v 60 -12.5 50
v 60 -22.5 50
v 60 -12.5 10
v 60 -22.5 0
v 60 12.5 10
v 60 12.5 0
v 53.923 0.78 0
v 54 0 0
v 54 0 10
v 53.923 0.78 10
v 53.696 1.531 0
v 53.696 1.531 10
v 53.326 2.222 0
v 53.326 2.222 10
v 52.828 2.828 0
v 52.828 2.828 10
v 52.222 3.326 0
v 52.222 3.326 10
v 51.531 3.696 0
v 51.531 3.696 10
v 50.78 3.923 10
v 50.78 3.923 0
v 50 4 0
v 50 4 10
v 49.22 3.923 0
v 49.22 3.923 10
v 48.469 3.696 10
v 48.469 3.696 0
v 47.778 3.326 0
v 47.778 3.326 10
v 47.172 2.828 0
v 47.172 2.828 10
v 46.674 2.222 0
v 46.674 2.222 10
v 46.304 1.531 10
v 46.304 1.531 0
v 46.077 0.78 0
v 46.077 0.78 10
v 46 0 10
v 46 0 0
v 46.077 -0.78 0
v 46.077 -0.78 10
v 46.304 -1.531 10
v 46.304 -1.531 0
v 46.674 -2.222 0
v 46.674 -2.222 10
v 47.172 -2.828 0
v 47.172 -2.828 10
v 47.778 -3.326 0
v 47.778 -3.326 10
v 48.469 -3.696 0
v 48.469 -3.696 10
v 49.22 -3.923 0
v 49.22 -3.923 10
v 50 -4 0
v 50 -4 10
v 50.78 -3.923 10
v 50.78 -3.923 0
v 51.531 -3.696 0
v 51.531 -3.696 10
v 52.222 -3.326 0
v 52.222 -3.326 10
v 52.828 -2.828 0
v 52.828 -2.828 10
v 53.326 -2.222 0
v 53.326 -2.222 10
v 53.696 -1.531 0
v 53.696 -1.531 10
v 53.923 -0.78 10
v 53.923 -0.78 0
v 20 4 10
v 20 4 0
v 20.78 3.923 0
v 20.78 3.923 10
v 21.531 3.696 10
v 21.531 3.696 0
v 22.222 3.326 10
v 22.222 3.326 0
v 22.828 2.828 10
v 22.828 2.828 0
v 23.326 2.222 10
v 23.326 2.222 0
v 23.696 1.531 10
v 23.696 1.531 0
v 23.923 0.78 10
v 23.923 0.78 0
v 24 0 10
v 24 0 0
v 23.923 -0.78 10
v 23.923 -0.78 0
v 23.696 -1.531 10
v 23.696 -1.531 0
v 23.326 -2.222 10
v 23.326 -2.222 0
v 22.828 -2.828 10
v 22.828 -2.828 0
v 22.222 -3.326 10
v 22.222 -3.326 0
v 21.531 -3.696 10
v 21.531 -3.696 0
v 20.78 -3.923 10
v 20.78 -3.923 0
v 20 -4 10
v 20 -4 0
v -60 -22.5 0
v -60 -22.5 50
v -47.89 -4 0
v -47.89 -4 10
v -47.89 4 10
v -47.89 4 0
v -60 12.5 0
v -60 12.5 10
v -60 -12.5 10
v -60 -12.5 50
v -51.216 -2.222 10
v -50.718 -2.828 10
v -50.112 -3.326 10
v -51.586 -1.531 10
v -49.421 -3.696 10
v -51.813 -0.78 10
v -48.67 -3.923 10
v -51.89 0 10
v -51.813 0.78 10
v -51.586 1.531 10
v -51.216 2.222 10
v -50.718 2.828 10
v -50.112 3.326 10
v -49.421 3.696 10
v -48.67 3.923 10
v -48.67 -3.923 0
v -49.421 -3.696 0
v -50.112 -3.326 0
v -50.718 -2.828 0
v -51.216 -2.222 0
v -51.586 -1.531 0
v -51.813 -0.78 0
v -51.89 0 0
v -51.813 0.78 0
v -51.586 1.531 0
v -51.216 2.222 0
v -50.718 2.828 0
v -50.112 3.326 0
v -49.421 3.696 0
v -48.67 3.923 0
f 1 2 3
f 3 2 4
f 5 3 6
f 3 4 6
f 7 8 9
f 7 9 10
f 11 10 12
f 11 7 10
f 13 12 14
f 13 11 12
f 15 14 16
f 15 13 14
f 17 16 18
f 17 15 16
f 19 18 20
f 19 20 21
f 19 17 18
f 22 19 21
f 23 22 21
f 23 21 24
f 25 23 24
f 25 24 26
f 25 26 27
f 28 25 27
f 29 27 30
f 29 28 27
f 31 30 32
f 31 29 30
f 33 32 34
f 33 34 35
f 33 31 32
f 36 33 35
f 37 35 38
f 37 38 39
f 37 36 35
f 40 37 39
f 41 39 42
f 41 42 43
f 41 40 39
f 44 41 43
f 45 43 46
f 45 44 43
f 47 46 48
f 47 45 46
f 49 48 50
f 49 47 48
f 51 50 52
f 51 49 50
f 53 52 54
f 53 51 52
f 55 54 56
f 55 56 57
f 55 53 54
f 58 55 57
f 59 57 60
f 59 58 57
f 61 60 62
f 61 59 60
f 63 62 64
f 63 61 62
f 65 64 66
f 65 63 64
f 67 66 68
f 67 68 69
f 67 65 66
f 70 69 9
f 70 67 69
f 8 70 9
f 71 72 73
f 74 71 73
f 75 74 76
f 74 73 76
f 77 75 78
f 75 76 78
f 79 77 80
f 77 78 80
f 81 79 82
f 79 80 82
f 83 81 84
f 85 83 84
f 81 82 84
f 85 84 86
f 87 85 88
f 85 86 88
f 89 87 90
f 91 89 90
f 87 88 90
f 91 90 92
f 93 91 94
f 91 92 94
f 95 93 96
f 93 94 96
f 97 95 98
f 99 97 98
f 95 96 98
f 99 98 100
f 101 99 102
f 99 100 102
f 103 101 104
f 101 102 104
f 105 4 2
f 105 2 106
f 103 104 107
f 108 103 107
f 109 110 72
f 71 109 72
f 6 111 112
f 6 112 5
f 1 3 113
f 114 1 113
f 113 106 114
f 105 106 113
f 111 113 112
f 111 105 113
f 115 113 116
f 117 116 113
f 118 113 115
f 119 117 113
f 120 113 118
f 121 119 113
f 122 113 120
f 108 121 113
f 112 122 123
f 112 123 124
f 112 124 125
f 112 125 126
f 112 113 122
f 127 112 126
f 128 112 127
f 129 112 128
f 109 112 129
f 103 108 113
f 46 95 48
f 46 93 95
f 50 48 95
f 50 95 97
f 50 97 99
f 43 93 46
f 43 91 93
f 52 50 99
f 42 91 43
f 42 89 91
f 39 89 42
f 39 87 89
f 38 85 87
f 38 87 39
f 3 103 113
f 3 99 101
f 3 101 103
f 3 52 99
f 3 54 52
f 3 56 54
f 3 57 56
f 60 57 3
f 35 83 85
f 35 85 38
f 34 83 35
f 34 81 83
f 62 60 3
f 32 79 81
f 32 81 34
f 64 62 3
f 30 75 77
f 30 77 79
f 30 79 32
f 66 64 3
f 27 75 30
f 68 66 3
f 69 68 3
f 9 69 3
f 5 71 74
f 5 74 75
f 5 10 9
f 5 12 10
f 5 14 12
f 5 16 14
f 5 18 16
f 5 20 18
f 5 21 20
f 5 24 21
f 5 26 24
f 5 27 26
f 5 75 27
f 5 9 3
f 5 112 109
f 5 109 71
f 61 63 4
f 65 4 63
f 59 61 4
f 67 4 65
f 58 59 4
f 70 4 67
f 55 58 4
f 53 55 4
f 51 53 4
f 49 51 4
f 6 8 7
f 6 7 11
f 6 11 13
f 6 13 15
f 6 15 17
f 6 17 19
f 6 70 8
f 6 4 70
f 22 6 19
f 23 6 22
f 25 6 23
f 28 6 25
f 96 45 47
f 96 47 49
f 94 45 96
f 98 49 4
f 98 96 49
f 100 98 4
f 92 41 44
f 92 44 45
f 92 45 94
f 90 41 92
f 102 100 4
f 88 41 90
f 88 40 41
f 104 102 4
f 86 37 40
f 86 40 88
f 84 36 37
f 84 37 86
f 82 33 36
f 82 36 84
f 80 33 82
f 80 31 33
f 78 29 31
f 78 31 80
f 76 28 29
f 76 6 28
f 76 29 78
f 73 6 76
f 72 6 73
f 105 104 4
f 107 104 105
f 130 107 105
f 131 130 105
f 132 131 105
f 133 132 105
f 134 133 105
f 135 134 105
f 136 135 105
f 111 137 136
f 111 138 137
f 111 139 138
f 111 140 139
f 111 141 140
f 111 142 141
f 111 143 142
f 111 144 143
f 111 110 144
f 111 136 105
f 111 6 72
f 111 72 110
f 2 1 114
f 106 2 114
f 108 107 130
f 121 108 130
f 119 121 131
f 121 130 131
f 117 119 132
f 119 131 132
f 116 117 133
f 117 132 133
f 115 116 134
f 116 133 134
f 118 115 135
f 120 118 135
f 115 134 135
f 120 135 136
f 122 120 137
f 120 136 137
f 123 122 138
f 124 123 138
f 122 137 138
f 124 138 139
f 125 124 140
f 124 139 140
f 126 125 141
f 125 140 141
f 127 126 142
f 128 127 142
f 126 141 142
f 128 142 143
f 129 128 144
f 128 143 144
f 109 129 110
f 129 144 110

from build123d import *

# Parameters (mm, degrees)
SKETCH1_W           = 120
SKETCH1_H           = 25
SKETCH1_R           = 4
BOSS_EXTRUDE1_DEPTH = 10
SKETCH2_W           = 120
SKETCH2_H           = 10
BOSS_EXTRUDE2_DEPTH = 50


with BuildPart() as part:
    # Sketch1 → Boss-Extrude1 (new body)
    with BuildSketch(Plane.XY):
        Rectangle(SKETCH1_W, SKETCH1_H)
        with Locations((50, 0)):
            Circle(SKETCH1_R, mode=Mode.SUBTRACT)
        with BuildLine():
            Line((-47.89, 4), (20, 4))
            ThreePointArc((20, 4), (24, 0), (20, -4))
            Line((20, -4), (-47.89, -4))
            ThreePointArc((-47.89, -4), (-51.89, 0), (-47.89, 4))
        make_face(mode=Mode.SUBTRACT)
    extrude(amount=BOSS_EXTRUDE1_DEPTH)

    # Sketch2 → Boss-Extrude2 (add)
    with BuildSketch(Plane(origin=(0, 0, 0), x_dir=(-1, 0, 0), z_dir=(0, 0, -1))):
        with Locations((0, -17.5)):
            Rectangle(SKETCH2_W, SKETCH2_H)
    extrude(amount=-BOSS_EXTRUDE2_DEPTH)


solid = part.part
